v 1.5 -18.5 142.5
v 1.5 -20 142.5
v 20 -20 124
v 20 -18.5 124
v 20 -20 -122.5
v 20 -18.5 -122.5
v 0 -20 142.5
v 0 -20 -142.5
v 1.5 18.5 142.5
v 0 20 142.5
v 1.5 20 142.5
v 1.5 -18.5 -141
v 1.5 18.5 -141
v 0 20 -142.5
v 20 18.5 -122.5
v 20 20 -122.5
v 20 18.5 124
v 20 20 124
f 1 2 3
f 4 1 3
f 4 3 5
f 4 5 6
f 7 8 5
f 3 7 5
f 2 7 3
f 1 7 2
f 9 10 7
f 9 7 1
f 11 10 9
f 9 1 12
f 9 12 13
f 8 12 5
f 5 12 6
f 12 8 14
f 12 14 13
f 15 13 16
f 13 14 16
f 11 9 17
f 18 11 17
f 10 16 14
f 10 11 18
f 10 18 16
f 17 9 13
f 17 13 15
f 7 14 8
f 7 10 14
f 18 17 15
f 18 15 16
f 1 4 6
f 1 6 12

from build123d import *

# Parameters (mm, degrees)
RESSALTO_EXTRUS_O1_DEPTH = 142.5
CORTE_EXTRUS_O1_DEPTH    = 50


with BuildPart() as part:
    # Esboço1 → Ressalto-extrusão1 (new, symmetric)
    with BuildSketch(Plane.XY):
        Polygon((0, 20), (0, -20), (20, -20), (20, -18.5), (1.5, -18.5), (1.5, 18.5), (20, 18.5), (20, 20), align=None)
    extrude(amount=RESSALTO_EXTRUS_O1_DEPTH, both=True)

    # Esboço2 → Corte-extrusão1 (cut, symmetric)
    with BuildSketch(Plane(origin=(0, 20, 0), x_dir=(1, 0, 0), z_dir=(0, 1, 0))):
        Polygon((1.5, -142.5), (20, -124), (20, -142.5), align=None)
        Polygon((0, 142.5), (20, 122.5), (20, 142.5), align=None)
    extrude(amount=CORTE_EXTRUS_O1_DEPTH, both=True, mode=Mode.SUBTRACT)


solid = part.part
